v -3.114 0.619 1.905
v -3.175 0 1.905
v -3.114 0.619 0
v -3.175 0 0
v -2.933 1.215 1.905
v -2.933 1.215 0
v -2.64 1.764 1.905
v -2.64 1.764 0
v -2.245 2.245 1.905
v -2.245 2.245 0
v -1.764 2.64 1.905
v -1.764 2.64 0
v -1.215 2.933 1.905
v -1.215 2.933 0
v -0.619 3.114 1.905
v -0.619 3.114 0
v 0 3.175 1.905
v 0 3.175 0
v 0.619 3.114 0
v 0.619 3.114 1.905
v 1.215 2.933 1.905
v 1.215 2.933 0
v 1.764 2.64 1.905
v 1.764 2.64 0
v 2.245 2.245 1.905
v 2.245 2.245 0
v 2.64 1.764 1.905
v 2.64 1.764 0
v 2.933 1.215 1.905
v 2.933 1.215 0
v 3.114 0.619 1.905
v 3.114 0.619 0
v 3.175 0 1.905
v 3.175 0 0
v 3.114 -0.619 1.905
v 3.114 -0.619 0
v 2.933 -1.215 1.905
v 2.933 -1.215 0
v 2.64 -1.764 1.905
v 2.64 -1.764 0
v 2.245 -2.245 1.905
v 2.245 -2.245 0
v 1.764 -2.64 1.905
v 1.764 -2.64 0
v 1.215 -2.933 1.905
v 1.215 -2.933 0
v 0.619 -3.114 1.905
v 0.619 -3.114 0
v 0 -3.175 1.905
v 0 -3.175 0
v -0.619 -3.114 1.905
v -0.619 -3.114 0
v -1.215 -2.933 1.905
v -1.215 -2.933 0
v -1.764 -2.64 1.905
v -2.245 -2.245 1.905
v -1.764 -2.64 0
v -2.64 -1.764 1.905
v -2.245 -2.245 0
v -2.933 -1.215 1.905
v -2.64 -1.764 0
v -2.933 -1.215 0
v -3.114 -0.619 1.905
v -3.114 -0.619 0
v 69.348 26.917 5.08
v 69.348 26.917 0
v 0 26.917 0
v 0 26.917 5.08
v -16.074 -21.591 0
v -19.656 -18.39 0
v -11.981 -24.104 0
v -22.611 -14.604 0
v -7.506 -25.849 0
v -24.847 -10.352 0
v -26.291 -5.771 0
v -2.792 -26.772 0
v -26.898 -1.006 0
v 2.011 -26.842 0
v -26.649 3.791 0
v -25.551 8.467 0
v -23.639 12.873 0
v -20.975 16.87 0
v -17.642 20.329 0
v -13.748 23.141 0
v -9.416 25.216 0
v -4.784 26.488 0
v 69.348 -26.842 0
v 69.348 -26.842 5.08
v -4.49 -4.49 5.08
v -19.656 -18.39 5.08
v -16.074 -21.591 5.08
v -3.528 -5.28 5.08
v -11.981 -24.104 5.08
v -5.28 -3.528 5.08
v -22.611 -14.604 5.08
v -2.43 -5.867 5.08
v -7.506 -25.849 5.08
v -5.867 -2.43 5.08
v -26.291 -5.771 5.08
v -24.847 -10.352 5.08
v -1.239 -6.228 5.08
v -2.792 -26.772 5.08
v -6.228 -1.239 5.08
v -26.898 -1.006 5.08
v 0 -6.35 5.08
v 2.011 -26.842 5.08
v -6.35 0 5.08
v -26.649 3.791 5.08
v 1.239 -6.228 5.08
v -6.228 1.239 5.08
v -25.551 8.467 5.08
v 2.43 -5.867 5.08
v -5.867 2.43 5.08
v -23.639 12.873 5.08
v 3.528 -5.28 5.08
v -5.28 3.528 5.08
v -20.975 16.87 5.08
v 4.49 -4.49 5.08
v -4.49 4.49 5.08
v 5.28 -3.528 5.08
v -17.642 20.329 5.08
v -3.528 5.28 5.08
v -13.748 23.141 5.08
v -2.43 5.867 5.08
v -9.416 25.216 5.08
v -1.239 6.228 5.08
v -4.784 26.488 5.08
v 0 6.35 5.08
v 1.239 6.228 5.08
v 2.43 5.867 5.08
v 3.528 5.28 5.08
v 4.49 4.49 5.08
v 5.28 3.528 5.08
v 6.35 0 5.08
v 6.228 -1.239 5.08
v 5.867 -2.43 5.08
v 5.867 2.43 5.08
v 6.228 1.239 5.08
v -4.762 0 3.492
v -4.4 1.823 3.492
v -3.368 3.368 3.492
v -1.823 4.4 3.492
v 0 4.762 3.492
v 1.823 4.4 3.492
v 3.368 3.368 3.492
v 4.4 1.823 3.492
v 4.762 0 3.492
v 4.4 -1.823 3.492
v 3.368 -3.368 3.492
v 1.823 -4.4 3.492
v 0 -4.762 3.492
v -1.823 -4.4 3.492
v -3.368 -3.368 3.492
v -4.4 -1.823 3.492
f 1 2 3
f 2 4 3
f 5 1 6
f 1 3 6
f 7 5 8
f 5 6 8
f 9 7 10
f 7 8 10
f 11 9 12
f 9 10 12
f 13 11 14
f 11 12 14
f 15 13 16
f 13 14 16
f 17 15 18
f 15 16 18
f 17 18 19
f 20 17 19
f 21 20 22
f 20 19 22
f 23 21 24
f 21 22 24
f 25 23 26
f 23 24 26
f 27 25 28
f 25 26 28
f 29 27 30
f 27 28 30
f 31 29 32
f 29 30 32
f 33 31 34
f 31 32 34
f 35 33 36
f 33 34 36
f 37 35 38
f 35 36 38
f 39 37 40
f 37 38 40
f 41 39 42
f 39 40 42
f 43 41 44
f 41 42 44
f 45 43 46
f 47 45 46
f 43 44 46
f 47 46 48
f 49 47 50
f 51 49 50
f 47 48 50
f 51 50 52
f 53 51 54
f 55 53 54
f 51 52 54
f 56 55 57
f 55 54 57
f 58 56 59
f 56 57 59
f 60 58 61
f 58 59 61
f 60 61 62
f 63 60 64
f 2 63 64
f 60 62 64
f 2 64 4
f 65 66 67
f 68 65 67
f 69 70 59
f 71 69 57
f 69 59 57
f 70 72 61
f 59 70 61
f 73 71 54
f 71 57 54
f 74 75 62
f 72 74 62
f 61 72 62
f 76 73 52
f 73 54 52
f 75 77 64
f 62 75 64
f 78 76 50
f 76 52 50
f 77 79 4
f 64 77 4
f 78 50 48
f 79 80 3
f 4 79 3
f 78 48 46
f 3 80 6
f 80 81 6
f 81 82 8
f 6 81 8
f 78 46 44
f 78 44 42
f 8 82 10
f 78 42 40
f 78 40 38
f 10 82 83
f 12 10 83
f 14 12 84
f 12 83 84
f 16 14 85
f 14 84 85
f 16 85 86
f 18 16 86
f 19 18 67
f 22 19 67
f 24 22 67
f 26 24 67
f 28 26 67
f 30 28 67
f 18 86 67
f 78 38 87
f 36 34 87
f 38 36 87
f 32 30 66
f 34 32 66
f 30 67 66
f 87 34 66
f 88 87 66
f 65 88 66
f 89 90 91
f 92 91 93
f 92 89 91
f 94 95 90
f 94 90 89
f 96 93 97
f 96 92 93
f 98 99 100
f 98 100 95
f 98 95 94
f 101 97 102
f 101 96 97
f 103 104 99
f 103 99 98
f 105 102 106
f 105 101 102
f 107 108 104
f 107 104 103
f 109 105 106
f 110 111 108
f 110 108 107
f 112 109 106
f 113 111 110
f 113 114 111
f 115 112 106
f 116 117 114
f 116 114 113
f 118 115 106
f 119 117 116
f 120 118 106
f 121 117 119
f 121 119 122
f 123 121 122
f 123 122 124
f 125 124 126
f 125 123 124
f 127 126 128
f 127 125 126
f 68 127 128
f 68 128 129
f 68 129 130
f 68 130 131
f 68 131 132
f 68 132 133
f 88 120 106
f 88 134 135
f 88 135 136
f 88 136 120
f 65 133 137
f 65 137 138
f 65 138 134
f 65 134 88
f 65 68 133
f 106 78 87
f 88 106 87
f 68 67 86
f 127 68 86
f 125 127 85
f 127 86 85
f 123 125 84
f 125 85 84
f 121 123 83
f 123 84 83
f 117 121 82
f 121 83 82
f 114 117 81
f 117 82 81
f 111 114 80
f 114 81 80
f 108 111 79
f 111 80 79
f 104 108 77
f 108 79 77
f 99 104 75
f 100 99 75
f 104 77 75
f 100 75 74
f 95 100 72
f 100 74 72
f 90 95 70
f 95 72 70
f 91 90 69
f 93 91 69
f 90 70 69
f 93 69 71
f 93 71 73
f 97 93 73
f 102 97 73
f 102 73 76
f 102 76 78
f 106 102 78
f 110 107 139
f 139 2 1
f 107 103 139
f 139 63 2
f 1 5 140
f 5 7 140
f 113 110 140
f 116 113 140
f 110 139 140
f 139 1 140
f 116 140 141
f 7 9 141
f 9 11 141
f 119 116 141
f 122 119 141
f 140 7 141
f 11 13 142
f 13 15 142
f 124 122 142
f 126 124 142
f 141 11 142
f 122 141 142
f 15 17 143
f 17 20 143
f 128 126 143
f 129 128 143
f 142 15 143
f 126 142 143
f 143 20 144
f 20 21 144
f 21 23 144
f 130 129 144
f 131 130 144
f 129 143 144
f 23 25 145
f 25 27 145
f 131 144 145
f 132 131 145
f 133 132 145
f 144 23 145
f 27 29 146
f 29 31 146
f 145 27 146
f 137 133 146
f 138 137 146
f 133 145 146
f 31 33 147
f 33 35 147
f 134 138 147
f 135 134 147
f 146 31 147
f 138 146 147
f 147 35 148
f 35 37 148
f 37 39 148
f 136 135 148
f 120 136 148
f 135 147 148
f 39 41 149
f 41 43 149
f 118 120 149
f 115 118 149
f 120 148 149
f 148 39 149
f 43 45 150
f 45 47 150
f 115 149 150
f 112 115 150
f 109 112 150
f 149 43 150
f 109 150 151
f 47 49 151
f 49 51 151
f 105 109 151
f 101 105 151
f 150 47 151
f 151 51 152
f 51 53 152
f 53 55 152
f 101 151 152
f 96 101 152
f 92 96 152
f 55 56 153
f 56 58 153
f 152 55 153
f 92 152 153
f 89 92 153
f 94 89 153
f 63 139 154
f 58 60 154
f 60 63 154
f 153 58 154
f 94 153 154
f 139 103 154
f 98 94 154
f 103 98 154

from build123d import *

# Parameters (mm, degrees)
F1_DEPTH       = 5.08
F3_D           = 6.35
F3_CSINK_D     = 12.7
F3_CSINK_ANGLE = 90


with BuildPart() as f1:
    # F0 (on Top) → F1 (new body)
    with BuildSketch(Plane.XY):
        with BuildLine():
            ThreePointArc((2.0111581622, -26.8418043852), (19.731467902, -18.3083695134), (26.9170432961, 0))
            ThreePointArc((26.9170432961, 0), (19.0332238442, 19.0332238442), (0, 26.9170432961))
            Line((0, 26.9170432961), (0, -26.8418043852))
            Line((0, -26.8418043852), (2.0111581622, -26.8418043852))
        make_face()
        with BuildLine():
            ThreePointArc((0, 26.9170432961), (19.0332238442, 19.0332238442), (26.9170432961, 0))
            ThreePointArc((26.9170432961, 0), (19.731467902, -18.3083695134), (2.0111581622, -26.8418043852))
            Line((2.0111581622, -26.8418043852), (69.3475157022, -26.8418043852))
            Line((69.3475157022, -26.8418043852), (69.3475157022, 26.9170432961))
            Line((69.3475157022, 26.9170432961), (0, 26.9170432961))
        make_face()
        with BuildLine():
            Line((0, -26.8418043852), (0, 26.9170432961))
            ThreePointArc((0, 26.9170432961), (-26.8982269916, -1.0062825209), (2.0111581622, -26.8418043852))
            Line((2.0111581622, -26.8418043852), (0, -26.8418043852))
        make_face()
    extrude(amount=F1_DEPTH)

    # F3 (through all)
    with Locations(Plane.XY.offset(5.08)):
        with Locations((0, 0)):
            CounterSinkHole(F3_D / 2, F3_CSINK_D / 2, counter_sink_angle=F3_CSINK_ANGLE)


solid = f1.part
